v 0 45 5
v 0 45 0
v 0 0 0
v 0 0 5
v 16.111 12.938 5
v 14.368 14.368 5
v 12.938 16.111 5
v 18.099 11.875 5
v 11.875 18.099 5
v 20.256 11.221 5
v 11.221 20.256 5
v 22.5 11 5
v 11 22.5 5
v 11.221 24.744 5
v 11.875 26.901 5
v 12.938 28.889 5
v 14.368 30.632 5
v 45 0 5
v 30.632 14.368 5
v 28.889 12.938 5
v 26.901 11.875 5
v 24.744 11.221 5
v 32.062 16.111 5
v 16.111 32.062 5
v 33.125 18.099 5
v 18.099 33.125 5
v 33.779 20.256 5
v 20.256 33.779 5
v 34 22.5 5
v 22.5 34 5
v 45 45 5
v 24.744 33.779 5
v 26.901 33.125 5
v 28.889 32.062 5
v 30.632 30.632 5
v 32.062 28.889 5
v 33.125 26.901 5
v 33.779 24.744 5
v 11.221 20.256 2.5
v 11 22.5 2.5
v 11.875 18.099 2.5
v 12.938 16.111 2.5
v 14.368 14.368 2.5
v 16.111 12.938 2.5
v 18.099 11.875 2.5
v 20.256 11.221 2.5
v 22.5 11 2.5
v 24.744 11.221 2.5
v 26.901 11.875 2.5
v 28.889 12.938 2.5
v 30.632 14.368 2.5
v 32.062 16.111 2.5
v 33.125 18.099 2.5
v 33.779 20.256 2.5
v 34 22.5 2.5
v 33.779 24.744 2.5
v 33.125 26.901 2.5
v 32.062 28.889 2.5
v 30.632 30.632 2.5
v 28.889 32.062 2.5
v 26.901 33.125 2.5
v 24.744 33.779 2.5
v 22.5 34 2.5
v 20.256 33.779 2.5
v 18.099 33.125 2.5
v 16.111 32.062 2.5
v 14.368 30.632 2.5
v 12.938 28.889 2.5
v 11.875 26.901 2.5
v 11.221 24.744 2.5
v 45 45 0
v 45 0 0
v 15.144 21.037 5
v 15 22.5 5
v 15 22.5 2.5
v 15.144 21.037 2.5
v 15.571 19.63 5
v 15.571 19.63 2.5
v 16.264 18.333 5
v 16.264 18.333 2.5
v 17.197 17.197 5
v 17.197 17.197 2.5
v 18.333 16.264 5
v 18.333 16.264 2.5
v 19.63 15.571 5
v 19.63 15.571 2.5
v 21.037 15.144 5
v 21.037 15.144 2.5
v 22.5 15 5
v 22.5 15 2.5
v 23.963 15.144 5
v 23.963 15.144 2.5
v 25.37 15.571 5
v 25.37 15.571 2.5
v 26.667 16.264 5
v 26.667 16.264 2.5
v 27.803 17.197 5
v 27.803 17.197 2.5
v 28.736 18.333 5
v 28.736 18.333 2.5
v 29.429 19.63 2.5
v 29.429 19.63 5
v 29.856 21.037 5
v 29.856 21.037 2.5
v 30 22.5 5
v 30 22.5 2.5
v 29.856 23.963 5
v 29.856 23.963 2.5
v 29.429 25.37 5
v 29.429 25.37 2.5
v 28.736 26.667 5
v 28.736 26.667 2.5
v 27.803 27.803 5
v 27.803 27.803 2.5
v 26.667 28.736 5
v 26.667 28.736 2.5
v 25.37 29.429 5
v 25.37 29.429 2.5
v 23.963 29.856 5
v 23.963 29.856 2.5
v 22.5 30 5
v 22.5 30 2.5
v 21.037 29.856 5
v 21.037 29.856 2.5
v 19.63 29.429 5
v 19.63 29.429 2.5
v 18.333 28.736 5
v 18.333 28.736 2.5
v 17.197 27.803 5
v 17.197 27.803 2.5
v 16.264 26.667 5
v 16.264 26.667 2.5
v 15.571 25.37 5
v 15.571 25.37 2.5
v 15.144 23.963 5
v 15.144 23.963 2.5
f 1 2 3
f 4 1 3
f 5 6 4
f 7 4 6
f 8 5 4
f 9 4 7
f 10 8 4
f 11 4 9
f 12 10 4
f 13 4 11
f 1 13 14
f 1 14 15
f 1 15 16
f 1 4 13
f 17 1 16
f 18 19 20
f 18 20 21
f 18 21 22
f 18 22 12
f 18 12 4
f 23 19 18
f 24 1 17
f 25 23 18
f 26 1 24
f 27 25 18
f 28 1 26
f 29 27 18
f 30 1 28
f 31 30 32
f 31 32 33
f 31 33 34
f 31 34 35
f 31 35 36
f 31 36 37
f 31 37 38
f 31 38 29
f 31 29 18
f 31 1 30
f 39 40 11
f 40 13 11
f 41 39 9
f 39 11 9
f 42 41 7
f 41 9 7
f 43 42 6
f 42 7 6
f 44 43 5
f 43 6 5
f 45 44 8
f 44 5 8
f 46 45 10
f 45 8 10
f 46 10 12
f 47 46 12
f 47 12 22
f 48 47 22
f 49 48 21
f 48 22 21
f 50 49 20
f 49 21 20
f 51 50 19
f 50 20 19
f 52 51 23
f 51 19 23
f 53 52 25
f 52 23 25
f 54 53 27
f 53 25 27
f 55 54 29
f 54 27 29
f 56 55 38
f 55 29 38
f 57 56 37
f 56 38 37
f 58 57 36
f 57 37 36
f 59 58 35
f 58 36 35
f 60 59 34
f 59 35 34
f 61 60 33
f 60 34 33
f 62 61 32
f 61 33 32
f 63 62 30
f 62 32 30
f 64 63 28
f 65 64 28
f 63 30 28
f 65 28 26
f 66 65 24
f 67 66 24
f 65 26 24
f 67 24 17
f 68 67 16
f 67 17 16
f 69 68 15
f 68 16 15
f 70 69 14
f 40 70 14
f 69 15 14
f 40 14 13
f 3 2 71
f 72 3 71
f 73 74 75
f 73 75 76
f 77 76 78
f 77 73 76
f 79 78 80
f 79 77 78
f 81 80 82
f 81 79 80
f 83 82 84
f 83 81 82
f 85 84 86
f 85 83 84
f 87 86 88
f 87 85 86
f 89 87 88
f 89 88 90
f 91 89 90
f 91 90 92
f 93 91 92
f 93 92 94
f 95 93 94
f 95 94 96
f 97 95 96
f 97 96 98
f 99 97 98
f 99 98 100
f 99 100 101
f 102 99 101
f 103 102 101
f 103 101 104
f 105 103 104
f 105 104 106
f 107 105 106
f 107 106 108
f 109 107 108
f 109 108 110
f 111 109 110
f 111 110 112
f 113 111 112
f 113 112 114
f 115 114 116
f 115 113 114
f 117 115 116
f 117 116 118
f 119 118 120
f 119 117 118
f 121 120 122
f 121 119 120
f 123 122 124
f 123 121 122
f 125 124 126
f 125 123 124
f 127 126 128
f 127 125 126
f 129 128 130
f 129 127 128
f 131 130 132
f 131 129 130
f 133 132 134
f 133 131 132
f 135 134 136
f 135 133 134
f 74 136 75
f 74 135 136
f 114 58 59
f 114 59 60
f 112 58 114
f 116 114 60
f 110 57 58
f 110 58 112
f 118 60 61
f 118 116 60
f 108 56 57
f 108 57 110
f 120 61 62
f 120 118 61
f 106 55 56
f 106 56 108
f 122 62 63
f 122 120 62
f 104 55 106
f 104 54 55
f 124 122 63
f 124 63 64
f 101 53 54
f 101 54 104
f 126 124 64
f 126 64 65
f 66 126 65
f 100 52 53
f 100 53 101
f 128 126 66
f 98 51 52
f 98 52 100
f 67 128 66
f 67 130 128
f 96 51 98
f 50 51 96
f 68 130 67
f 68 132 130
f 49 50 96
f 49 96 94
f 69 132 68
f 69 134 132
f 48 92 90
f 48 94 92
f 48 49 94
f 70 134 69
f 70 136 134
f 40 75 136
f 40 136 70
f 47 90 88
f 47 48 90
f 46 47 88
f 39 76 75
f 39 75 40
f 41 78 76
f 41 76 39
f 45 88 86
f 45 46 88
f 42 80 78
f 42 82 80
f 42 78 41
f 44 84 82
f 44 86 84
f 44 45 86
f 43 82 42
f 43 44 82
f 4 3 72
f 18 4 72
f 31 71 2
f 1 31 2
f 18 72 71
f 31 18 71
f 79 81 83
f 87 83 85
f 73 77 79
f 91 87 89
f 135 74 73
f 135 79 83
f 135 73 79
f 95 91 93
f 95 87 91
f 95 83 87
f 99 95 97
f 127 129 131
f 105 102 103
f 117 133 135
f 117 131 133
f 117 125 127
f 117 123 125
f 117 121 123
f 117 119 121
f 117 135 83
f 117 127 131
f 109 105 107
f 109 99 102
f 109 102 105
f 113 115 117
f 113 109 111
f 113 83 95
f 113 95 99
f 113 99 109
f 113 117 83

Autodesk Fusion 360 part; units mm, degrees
sketch "Sketch1" plane through (0, 0, 0) normal (0, 0, 1) x (1, 0, 0)
  line L0 (0, 0) -> (45, 0)
  line L1 (45, 0) -> (45, 45)
  line L2 (45, 45) -> (0, 45)
  line L3 (0, 45) -> (0, 0)
  dimension "d1" = 45
  dimension "d2" = 45
extrude "Extrude1" add sketch "Sketch1" along normal blind 5
sketch "Sketch2" plane through (0, 0, 5) normal (0, 0, 1) x (-1, 0, 0)
  line L0 (0, -45) -> (0, 0)
  line L1 (0, 0) -> (-45, 0)
  line L2 (-45, 0) -> (-45, -50)
  line L3 (-45, -45) -> (0, -45)
  line L4 (0, -45) -> (-45, -45)
  line L5 (-45, -45) -> (-45, -50)
  line L6 (-45, -50) -> (0, -50)
  line L7 (0, -50) -> (0, -45)
  line L8 (0, 0) -> (-45, 0)
  line L9 (-45, 0) -> (-45, 5)
  line L10 (-45, 5) -> (0, 5)
  line L11 (0, 5) -> (0, 0)
  line L12 (0, -50) -> (-45, 5)
  line L13 (-45, -50) -> (0, 5)
  circle A0 centre (-22.5, -22.5) radius 7.5
  circle A1 centre (-22.5, -22.5) radius 11.5
  dimension "d5" = 45
  dimension "d6" = 5
  dimension "d7" = 45
  dimension "d8" = 5
  dimension "d13" = 15
  dimension "d14" = 23
extrude "Extrude3" cut sketch "Sketch2" against normal blind 2.5 contours L12 L13 A0 A1 | L12 L13 A0 A1 | L12 L13 A0 A1 | L12 L13 A0 A1
